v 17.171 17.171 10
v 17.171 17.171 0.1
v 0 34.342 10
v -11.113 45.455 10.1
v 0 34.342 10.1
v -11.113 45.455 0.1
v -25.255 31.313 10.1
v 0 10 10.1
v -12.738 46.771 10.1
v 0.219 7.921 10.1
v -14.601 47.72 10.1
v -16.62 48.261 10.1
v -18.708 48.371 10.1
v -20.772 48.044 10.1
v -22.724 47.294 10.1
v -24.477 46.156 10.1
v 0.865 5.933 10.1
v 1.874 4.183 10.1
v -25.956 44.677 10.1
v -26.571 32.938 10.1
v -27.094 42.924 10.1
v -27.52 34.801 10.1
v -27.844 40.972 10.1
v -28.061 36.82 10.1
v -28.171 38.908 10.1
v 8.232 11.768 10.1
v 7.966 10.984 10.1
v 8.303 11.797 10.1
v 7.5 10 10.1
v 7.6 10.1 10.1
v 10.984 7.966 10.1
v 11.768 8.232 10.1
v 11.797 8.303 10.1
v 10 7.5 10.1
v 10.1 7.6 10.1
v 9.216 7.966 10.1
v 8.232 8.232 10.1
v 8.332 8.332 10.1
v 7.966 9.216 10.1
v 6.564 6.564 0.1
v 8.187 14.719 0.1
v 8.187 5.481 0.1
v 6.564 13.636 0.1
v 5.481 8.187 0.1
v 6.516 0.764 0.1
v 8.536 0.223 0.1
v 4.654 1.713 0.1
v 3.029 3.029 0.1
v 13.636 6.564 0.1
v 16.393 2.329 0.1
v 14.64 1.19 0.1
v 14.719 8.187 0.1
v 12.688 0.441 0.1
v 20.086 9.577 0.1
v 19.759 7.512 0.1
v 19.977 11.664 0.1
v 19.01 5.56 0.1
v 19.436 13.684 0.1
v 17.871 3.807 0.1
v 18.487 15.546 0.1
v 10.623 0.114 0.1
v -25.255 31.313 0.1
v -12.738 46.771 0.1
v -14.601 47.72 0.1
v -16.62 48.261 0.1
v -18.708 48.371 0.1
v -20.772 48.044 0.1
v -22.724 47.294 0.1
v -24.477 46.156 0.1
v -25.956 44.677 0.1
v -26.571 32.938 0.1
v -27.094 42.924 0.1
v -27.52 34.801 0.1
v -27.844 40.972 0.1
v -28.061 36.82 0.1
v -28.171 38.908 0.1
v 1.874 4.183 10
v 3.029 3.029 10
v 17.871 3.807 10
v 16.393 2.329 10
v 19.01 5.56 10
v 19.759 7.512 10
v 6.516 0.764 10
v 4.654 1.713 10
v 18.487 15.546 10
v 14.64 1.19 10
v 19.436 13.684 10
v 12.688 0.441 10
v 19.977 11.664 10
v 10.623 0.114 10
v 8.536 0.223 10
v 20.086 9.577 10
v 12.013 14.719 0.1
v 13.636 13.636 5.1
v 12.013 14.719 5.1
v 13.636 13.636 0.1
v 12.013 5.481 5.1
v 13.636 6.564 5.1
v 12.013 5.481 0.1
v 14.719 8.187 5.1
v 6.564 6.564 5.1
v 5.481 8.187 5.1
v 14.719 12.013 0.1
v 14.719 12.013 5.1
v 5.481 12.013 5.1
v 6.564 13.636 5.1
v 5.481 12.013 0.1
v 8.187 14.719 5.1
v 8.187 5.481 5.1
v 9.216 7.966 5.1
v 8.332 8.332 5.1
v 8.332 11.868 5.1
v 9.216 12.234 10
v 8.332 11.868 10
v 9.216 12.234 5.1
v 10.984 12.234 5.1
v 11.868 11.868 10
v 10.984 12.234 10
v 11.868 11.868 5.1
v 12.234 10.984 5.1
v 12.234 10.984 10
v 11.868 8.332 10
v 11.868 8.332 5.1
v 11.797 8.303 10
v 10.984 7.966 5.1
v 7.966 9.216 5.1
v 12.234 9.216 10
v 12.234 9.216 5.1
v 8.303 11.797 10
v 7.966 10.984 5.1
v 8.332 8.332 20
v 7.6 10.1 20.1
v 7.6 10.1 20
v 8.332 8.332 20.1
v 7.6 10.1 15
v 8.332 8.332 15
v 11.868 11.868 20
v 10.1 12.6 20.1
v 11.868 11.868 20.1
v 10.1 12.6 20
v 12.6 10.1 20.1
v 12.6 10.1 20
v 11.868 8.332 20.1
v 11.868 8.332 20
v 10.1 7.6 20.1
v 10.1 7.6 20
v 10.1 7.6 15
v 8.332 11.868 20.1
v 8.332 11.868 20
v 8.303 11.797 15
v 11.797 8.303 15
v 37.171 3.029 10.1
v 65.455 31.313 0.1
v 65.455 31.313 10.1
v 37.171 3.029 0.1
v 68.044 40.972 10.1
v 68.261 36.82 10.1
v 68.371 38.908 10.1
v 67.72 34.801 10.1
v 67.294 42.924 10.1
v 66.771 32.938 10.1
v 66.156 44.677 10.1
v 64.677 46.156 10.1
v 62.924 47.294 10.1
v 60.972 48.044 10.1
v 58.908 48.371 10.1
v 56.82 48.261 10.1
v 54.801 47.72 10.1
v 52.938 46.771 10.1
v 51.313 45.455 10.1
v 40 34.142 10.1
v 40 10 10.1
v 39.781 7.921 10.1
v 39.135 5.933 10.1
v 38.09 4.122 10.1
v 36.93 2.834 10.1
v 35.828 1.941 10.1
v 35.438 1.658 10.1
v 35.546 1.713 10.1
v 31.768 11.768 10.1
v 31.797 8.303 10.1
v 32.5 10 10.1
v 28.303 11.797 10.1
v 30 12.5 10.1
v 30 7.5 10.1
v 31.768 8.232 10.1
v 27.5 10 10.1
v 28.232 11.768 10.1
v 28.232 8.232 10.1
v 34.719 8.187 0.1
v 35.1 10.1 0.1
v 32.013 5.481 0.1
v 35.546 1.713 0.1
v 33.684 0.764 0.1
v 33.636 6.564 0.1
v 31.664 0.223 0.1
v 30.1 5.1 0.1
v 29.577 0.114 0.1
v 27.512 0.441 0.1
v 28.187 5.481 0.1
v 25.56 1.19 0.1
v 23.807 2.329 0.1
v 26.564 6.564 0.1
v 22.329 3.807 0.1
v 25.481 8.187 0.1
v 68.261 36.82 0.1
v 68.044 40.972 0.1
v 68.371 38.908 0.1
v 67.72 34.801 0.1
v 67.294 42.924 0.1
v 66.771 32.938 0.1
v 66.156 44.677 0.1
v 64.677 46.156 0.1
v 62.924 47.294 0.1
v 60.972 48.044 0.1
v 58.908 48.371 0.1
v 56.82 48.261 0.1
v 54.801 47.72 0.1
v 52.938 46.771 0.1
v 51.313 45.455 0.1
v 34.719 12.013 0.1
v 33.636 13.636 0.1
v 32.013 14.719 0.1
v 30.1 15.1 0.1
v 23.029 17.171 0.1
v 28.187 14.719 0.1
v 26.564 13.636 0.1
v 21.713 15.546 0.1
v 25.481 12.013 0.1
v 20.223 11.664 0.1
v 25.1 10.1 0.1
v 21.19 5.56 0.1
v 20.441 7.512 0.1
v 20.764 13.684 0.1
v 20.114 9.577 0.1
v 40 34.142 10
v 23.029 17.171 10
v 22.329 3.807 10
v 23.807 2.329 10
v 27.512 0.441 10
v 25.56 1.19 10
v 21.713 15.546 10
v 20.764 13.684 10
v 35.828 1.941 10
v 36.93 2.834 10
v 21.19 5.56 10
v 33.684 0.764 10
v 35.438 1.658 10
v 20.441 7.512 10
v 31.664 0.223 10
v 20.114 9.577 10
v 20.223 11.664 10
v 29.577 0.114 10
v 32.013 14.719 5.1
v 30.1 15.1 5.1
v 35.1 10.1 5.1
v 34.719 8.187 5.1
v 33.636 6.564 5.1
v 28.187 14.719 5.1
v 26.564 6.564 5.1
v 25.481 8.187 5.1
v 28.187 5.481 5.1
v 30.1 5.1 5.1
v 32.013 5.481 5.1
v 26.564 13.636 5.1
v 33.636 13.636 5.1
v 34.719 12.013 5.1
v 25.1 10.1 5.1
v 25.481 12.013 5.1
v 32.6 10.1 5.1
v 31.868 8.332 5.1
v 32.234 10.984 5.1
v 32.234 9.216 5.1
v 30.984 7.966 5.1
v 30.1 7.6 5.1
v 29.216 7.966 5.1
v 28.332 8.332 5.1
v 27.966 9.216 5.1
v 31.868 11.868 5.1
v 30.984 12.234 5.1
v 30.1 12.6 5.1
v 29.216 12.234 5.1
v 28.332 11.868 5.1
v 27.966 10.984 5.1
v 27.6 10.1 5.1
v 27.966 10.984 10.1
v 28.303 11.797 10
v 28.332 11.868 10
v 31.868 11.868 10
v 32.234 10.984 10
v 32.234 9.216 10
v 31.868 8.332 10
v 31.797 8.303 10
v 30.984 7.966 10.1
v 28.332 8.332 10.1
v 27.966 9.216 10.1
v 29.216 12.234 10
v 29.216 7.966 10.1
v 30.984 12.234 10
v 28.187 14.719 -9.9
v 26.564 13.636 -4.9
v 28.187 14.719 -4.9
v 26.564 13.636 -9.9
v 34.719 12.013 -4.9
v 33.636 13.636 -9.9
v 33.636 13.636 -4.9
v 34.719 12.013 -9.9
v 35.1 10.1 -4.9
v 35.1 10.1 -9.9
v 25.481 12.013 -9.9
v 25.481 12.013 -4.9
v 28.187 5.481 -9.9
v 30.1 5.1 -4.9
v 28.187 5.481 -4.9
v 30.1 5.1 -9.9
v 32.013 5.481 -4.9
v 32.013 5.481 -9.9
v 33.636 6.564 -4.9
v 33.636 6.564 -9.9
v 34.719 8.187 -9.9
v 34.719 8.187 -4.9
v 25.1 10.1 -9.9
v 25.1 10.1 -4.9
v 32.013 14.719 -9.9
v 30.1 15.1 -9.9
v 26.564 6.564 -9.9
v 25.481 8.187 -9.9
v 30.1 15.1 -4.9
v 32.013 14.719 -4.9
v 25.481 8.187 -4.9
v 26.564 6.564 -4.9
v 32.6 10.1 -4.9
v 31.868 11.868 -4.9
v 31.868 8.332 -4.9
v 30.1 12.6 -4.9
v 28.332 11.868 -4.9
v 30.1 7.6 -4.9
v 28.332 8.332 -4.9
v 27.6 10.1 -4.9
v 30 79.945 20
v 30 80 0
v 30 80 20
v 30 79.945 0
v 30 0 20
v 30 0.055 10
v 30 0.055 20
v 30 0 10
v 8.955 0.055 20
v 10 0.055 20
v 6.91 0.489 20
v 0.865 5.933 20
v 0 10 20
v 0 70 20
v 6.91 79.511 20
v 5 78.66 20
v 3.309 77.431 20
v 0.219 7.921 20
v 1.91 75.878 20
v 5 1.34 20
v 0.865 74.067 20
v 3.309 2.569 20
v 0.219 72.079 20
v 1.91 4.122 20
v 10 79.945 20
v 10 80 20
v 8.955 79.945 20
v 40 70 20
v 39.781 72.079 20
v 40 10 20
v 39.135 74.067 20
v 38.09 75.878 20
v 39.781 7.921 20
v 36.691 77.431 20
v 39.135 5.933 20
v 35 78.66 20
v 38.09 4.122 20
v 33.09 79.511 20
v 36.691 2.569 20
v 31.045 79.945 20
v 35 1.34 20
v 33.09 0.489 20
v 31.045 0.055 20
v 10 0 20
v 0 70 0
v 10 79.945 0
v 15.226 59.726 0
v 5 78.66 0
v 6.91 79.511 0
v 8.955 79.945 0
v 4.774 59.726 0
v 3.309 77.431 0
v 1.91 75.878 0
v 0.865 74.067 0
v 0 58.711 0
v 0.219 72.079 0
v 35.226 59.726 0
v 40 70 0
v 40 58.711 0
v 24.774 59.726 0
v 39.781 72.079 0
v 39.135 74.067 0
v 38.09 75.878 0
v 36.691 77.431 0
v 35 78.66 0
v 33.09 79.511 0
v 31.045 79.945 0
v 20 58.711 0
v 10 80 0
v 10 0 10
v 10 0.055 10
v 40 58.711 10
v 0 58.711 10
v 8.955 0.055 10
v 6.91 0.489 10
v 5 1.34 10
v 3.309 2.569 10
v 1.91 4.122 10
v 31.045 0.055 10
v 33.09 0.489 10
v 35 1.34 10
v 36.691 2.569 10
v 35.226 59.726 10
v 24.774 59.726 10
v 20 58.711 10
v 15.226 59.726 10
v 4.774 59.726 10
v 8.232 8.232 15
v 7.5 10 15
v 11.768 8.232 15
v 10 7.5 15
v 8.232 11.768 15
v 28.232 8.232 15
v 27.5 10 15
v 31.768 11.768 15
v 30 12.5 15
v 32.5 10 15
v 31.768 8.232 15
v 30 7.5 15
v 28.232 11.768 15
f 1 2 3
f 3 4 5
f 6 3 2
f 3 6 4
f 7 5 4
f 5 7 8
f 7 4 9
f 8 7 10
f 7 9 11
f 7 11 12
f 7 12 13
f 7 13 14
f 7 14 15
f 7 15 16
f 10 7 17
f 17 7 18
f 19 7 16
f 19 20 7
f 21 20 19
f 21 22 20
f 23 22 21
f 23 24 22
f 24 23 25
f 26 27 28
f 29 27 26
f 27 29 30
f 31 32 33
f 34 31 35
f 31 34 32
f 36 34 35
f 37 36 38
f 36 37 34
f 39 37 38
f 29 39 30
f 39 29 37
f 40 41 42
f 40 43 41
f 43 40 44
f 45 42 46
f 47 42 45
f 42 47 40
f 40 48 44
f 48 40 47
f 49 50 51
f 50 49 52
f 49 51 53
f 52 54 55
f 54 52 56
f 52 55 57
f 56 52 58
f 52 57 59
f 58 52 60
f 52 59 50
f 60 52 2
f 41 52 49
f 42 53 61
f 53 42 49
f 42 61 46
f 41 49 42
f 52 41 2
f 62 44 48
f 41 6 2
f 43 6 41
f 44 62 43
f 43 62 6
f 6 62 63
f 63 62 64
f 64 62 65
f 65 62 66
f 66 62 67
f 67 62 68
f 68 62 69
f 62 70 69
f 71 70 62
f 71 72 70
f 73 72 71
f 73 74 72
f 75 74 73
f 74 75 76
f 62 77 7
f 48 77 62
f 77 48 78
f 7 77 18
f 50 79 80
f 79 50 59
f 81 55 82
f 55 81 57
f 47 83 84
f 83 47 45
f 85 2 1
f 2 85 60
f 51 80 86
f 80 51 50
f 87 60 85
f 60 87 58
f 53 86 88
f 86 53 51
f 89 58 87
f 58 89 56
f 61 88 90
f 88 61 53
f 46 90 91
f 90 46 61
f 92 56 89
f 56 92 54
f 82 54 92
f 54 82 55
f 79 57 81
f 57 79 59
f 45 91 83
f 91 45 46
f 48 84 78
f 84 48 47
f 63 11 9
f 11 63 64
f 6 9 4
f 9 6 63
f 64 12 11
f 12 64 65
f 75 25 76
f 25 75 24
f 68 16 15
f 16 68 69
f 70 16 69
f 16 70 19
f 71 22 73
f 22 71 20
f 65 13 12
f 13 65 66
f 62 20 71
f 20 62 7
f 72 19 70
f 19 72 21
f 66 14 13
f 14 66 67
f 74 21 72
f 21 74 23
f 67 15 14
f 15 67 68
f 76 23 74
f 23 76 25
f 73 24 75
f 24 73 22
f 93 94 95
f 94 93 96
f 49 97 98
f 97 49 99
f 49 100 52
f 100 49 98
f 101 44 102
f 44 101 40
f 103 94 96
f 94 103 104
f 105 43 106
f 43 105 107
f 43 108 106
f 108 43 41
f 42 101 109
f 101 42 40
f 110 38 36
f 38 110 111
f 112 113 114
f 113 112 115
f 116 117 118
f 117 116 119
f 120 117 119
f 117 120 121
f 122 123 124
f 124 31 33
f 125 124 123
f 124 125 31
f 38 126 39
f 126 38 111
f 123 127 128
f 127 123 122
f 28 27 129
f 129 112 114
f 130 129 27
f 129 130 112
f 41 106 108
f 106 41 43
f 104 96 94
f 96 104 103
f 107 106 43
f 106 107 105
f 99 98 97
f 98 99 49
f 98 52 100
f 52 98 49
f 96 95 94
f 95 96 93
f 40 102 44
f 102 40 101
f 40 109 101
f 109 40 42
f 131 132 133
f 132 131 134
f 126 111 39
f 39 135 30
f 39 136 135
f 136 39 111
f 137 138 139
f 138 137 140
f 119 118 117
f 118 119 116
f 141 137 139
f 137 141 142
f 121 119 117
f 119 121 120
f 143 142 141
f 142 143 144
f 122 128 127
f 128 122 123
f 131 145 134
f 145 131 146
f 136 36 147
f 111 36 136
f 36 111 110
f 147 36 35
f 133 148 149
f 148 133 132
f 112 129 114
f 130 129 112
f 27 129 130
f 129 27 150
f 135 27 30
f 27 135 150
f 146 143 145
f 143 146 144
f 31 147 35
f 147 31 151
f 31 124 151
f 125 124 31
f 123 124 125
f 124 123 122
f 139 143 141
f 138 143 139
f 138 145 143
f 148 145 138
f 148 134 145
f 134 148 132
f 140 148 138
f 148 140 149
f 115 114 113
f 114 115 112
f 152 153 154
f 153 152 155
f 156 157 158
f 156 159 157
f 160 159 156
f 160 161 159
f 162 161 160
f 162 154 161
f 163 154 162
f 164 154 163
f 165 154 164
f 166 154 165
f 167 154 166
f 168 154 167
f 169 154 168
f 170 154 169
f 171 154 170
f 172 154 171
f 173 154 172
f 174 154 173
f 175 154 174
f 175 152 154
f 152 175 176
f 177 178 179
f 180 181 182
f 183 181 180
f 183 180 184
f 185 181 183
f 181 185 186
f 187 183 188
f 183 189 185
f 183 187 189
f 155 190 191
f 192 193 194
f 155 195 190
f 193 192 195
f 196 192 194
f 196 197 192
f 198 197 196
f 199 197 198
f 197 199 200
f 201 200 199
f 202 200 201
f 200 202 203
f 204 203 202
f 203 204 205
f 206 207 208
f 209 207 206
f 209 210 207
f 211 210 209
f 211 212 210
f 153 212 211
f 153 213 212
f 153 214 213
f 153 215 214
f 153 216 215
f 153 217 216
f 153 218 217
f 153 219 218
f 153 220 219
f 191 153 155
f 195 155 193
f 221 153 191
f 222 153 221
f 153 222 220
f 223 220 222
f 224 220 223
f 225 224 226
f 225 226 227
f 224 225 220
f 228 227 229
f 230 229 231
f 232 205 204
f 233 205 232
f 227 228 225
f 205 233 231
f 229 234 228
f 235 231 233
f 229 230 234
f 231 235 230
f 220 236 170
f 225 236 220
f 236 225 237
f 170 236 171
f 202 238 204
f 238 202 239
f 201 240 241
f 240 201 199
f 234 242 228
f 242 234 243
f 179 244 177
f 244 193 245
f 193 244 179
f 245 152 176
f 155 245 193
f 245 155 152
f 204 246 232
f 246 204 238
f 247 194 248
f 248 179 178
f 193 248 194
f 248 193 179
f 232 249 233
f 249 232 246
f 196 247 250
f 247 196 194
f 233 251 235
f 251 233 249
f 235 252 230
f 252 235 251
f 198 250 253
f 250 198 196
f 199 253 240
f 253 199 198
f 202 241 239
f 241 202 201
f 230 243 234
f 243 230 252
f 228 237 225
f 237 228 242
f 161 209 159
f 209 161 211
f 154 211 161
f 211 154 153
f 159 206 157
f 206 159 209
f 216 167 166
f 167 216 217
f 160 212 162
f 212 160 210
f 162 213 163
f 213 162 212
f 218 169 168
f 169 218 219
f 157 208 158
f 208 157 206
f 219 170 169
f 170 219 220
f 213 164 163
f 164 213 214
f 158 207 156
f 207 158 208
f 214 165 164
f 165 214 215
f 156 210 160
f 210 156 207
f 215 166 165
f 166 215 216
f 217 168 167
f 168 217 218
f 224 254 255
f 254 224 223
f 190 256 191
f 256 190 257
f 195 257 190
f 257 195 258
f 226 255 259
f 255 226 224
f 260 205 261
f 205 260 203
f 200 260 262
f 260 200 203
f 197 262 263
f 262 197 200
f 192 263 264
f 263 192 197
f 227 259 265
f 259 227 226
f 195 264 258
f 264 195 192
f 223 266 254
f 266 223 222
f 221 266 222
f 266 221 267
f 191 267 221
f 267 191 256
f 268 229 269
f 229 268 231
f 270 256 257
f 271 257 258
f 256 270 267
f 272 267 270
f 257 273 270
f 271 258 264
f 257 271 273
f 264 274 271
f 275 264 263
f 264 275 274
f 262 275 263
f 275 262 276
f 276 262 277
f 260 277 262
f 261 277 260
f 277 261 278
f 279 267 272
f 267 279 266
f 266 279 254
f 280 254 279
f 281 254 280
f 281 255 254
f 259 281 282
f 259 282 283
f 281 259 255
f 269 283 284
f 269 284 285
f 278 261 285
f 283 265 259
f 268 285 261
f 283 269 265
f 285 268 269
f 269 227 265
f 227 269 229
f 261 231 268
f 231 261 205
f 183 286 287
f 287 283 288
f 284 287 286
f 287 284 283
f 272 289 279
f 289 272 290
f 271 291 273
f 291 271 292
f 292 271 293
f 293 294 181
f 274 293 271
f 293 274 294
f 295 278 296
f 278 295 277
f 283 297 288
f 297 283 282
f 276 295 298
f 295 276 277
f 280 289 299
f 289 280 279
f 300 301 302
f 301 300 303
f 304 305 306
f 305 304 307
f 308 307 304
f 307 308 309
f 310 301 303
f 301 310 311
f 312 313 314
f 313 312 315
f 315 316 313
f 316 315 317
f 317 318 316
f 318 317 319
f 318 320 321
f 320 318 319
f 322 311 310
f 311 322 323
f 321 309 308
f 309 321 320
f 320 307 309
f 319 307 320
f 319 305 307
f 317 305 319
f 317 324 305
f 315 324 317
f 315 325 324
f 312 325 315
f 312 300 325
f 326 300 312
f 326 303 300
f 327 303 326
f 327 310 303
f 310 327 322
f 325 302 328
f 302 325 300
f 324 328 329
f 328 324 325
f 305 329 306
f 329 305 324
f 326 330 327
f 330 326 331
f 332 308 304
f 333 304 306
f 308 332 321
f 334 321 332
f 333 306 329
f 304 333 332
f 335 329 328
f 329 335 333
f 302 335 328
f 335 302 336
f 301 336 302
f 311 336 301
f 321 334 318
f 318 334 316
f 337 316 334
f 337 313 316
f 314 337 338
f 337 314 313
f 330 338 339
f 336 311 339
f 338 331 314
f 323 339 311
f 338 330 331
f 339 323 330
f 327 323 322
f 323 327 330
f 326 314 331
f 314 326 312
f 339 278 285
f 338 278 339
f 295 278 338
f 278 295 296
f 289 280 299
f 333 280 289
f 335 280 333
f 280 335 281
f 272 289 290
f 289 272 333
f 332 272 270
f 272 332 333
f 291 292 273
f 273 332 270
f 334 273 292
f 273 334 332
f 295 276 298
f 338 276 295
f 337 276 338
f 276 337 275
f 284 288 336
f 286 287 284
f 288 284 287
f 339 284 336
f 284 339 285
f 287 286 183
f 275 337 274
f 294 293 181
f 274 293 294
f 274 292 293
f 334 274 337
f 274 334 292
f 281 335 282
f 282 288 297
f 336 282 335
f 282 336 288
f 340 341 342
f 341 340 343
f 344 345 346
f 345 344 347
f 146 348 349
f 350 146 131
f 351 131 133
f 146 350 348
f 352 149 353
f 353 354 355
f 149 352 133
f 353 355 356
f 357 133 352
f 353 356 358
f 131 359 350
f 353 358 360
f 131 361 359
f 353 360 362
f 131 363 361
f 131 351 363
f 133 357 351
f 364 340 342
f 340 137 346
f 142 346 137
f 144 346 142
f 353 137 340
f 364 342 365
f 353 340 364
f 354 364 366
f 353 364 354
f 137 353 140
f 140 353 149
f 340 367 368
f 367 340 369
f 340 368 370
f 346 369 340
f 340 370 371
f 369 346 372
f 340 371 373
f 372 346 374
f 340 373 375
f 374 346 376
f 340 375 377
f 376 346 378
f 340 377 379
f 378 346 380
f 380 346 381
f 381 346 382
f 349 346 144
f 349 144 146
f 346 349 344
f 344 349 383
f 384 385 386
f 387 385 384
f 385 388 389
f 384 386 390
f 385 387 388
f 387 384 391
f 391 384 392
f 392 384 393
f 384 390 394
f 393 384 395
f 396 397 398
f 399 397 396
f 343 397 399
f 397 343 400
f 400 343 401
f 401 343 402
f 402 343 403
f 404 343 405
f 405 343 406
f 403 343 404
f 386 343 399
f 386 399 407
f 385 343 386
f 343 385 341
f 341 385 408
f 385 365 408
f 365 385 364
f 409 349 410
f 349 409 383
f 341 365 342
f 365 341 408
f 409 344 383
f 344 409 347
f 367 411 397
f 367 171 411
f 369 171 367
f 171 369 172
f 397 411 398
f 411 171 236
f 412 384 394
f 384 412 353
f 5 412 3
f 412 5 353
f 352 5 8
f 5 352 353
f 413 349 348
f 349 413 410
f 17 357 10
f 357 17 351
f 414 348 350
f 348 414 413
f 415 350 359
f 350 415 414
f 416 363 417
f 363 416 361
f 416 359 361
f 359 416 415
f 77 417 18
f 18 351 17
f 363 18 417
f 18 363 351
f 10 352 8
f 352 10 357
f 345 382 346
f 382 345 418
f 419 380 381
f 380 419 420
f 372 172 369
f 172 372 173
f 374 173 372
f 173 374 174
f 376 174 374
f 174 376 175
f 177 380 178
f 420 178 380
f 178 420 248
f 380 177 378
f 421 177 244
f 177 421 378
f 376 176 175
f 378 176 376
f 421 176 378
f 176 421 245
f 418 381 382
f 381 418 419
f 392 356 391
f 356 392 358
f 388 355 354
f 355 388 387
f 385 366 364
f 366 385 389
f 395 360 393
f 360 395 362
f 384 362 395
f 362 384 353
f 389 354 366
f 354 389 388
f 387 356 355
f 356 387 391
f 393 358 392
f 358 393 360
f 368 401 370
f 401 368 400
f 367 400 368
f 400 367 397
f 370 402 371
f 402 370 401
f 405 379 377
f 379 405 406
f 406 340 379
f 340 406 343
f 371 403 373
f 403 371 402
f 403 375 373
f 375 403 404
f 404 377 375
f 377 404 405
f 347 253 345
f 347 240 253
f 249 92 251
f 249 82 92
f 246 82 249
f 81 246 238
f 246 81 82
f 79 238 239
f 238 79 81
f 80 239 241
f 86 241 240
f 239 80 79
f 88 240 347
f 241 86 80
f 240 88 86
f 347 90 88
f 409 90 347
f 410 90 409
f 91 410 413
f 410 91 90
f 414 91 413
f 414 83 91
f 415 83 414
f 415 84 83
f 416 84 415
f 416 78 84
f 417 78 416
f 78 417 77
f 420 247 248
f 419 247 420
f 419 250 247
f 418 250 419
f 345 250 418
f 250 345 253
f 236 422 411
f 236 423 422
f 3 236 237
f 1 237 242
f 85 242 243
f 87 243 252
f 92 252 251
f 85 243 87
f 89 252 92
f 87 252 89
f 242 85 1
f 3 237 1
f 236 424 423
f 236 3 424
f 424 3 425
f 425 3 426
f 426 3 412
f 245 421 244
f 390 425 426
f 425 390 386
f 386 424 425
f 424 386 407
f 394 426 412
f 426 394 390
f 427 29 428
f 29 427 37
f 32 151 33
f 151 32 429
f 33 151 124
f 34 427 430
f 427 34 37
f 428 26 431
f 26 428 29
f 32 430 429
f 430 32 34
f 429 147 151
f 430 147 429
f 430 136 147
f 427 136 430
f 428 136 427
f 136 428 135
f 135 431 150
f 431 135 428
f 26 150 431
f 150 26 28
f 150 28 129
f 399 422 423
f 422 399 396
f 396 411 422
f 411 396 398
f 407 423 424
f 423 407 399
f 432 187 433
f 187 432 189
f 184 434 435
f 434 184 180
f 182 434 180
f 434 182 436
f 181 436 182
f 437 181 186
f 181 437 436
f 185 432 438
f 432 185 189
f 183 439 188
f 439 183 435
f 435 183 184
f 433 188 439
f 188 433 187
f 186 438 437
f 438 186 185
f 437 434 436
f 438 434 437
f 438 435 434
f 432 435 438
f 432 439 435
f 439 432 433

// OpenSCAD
// file: ../lib/rounded_box.scad
//
//  Copyright (C) 05-11-2012 Jasper den Ouden.
//
//  This is free software: you can redistribute it and/or modify
//  it under the terms of the GNU General Public License as published
//  by the Free Software Foundation, either version 3 of the License, or
//  (at your option) any later version.
//

module sph_cyl(r,h, x,y)
{ sphere(r);
  cylinder(r=r,h= h-2*r);
  translate([0,0,h-2*r]) sphere(r);
  if(x > 0)
  { rotate(v=[0,1,0],a=90) cylinder(r=r,h=x);
    translate([0,0,h-2*r]) rotate(v=[0,1,0],a=90) cylinder(r=r,h=x);
  } else {
    rotate(v=[0,1,0],a=-90) cylinder(r=r,h=-x);
    translate([0,0,h-2*r]) rotate(v=[0,1,0],a=-90) cylinder(r=r,h=-x);
  }
  if(y > 0)
  { rotate(v=[1,0,0],a=90) cylinder(r=r,h=y);
    translate([0,0,h-2*r]) rotate(v=[1,0,0],a=90) cylinder(r=r,h=y);
  } else {
    rotate(v=[1,0,0],a=-90) cylinder(r=r,h=-y);
    translate([0,0,h-2*r]) rotate(v=[1,0,0],a=-90) cylinder(r=r,h=-y);
  }
}
//If only minkowski was fast.
module rounded_box(w,l,h,r)
{
    translate([r,r])
    { cube([w-2*r,l-2*r,h]);
    }
    translate([0,r,r]) cube([w,l-2*r,h-2*r]);
    translate([r,0,r]) cube([w-2*r,l,h-2*r]);

    translate([r,r,r]) sph_cyl(r,h, w-2*r,0);
    translate([r,l-r,r]) sph_cyl(r,h, w-2*r,l-2*r);
    translate([w-r,r,r]) sph_cyl(r,h, 0,-l+2*r);
    translate([w-r,l-r,r]) sph_cyl(r,h, 0,0);
}

//rounded_box(40,40,80,10);

//TODO less bad naming.
module rounded_cube(w,l,h,r)
{   translate([r,0]) cube([w-2*r, l, h]);
    translate([0,r]) cube([w, l-2*r, h]);
    
    translate([r,r]) cylinder(r=r, h=h);
    translate([w-r,r]) cylinder(r=r, h=h);
    translate([r,l-r]) cylinder(r=r, h=h);
    translate([w-r,l-r]) cylinder(r=r, h=h);
}
// main file
include<../lib/rounded_box.scad>

w = 40;
l = 80;
h = 20;
r =10;

hinge_y = 0.75*l;
hinge_h = 0.5*h;
hinge_r = 5;

s=0.1;

module expanding_base()
{
    difference()
    { rounded_cube(w,l,h,r);
      translate([w/4,w/4,-h]) 
      { cylinder(r=hinge_y-w/4, h=h+hinge_h);
        cylinder(r=w/16, h=1.75*h); //TODO add screw
      }
      translate([3*w/4,w/4,-h]) 
      { cylinder(r=hinge_y-w/4, h= h+hinge_h);
        cylinder(r=w/16, h=1.75*h); //TODO add screw.
      }
    }
}

module hinge()
{
    color([0,0,1]) difference()
    { translate([-w/4,-w/4]) rounded_cube(w/2,hinge_y,hinge_h, r);
      translate([0,0,-hinge_h/2]) {
          cylinder(r=w/8, h=hinge_h);
          cylinder(r=w/16, h=2*h);
      }
    }
}

module nut()
{  
    color([1,0,0]){
        cylinder(r=w/8, h=hinge_h/2);
        translate([0,0,0]) cylinder(r=w/16, h=h);
    }
}

a= 45*(1+sin(360*$t));

translate([w/4+s,w/4+s,s]) 
{ rotate(a=a) hinge();
  nut();
}
translate([3*w/4+s,w/4+s,s])
{ rotate(a=-a) hinge();
  translate([0,0,-h*(1+sin(360*$t))/2]) nut();
}

expanding_base();
